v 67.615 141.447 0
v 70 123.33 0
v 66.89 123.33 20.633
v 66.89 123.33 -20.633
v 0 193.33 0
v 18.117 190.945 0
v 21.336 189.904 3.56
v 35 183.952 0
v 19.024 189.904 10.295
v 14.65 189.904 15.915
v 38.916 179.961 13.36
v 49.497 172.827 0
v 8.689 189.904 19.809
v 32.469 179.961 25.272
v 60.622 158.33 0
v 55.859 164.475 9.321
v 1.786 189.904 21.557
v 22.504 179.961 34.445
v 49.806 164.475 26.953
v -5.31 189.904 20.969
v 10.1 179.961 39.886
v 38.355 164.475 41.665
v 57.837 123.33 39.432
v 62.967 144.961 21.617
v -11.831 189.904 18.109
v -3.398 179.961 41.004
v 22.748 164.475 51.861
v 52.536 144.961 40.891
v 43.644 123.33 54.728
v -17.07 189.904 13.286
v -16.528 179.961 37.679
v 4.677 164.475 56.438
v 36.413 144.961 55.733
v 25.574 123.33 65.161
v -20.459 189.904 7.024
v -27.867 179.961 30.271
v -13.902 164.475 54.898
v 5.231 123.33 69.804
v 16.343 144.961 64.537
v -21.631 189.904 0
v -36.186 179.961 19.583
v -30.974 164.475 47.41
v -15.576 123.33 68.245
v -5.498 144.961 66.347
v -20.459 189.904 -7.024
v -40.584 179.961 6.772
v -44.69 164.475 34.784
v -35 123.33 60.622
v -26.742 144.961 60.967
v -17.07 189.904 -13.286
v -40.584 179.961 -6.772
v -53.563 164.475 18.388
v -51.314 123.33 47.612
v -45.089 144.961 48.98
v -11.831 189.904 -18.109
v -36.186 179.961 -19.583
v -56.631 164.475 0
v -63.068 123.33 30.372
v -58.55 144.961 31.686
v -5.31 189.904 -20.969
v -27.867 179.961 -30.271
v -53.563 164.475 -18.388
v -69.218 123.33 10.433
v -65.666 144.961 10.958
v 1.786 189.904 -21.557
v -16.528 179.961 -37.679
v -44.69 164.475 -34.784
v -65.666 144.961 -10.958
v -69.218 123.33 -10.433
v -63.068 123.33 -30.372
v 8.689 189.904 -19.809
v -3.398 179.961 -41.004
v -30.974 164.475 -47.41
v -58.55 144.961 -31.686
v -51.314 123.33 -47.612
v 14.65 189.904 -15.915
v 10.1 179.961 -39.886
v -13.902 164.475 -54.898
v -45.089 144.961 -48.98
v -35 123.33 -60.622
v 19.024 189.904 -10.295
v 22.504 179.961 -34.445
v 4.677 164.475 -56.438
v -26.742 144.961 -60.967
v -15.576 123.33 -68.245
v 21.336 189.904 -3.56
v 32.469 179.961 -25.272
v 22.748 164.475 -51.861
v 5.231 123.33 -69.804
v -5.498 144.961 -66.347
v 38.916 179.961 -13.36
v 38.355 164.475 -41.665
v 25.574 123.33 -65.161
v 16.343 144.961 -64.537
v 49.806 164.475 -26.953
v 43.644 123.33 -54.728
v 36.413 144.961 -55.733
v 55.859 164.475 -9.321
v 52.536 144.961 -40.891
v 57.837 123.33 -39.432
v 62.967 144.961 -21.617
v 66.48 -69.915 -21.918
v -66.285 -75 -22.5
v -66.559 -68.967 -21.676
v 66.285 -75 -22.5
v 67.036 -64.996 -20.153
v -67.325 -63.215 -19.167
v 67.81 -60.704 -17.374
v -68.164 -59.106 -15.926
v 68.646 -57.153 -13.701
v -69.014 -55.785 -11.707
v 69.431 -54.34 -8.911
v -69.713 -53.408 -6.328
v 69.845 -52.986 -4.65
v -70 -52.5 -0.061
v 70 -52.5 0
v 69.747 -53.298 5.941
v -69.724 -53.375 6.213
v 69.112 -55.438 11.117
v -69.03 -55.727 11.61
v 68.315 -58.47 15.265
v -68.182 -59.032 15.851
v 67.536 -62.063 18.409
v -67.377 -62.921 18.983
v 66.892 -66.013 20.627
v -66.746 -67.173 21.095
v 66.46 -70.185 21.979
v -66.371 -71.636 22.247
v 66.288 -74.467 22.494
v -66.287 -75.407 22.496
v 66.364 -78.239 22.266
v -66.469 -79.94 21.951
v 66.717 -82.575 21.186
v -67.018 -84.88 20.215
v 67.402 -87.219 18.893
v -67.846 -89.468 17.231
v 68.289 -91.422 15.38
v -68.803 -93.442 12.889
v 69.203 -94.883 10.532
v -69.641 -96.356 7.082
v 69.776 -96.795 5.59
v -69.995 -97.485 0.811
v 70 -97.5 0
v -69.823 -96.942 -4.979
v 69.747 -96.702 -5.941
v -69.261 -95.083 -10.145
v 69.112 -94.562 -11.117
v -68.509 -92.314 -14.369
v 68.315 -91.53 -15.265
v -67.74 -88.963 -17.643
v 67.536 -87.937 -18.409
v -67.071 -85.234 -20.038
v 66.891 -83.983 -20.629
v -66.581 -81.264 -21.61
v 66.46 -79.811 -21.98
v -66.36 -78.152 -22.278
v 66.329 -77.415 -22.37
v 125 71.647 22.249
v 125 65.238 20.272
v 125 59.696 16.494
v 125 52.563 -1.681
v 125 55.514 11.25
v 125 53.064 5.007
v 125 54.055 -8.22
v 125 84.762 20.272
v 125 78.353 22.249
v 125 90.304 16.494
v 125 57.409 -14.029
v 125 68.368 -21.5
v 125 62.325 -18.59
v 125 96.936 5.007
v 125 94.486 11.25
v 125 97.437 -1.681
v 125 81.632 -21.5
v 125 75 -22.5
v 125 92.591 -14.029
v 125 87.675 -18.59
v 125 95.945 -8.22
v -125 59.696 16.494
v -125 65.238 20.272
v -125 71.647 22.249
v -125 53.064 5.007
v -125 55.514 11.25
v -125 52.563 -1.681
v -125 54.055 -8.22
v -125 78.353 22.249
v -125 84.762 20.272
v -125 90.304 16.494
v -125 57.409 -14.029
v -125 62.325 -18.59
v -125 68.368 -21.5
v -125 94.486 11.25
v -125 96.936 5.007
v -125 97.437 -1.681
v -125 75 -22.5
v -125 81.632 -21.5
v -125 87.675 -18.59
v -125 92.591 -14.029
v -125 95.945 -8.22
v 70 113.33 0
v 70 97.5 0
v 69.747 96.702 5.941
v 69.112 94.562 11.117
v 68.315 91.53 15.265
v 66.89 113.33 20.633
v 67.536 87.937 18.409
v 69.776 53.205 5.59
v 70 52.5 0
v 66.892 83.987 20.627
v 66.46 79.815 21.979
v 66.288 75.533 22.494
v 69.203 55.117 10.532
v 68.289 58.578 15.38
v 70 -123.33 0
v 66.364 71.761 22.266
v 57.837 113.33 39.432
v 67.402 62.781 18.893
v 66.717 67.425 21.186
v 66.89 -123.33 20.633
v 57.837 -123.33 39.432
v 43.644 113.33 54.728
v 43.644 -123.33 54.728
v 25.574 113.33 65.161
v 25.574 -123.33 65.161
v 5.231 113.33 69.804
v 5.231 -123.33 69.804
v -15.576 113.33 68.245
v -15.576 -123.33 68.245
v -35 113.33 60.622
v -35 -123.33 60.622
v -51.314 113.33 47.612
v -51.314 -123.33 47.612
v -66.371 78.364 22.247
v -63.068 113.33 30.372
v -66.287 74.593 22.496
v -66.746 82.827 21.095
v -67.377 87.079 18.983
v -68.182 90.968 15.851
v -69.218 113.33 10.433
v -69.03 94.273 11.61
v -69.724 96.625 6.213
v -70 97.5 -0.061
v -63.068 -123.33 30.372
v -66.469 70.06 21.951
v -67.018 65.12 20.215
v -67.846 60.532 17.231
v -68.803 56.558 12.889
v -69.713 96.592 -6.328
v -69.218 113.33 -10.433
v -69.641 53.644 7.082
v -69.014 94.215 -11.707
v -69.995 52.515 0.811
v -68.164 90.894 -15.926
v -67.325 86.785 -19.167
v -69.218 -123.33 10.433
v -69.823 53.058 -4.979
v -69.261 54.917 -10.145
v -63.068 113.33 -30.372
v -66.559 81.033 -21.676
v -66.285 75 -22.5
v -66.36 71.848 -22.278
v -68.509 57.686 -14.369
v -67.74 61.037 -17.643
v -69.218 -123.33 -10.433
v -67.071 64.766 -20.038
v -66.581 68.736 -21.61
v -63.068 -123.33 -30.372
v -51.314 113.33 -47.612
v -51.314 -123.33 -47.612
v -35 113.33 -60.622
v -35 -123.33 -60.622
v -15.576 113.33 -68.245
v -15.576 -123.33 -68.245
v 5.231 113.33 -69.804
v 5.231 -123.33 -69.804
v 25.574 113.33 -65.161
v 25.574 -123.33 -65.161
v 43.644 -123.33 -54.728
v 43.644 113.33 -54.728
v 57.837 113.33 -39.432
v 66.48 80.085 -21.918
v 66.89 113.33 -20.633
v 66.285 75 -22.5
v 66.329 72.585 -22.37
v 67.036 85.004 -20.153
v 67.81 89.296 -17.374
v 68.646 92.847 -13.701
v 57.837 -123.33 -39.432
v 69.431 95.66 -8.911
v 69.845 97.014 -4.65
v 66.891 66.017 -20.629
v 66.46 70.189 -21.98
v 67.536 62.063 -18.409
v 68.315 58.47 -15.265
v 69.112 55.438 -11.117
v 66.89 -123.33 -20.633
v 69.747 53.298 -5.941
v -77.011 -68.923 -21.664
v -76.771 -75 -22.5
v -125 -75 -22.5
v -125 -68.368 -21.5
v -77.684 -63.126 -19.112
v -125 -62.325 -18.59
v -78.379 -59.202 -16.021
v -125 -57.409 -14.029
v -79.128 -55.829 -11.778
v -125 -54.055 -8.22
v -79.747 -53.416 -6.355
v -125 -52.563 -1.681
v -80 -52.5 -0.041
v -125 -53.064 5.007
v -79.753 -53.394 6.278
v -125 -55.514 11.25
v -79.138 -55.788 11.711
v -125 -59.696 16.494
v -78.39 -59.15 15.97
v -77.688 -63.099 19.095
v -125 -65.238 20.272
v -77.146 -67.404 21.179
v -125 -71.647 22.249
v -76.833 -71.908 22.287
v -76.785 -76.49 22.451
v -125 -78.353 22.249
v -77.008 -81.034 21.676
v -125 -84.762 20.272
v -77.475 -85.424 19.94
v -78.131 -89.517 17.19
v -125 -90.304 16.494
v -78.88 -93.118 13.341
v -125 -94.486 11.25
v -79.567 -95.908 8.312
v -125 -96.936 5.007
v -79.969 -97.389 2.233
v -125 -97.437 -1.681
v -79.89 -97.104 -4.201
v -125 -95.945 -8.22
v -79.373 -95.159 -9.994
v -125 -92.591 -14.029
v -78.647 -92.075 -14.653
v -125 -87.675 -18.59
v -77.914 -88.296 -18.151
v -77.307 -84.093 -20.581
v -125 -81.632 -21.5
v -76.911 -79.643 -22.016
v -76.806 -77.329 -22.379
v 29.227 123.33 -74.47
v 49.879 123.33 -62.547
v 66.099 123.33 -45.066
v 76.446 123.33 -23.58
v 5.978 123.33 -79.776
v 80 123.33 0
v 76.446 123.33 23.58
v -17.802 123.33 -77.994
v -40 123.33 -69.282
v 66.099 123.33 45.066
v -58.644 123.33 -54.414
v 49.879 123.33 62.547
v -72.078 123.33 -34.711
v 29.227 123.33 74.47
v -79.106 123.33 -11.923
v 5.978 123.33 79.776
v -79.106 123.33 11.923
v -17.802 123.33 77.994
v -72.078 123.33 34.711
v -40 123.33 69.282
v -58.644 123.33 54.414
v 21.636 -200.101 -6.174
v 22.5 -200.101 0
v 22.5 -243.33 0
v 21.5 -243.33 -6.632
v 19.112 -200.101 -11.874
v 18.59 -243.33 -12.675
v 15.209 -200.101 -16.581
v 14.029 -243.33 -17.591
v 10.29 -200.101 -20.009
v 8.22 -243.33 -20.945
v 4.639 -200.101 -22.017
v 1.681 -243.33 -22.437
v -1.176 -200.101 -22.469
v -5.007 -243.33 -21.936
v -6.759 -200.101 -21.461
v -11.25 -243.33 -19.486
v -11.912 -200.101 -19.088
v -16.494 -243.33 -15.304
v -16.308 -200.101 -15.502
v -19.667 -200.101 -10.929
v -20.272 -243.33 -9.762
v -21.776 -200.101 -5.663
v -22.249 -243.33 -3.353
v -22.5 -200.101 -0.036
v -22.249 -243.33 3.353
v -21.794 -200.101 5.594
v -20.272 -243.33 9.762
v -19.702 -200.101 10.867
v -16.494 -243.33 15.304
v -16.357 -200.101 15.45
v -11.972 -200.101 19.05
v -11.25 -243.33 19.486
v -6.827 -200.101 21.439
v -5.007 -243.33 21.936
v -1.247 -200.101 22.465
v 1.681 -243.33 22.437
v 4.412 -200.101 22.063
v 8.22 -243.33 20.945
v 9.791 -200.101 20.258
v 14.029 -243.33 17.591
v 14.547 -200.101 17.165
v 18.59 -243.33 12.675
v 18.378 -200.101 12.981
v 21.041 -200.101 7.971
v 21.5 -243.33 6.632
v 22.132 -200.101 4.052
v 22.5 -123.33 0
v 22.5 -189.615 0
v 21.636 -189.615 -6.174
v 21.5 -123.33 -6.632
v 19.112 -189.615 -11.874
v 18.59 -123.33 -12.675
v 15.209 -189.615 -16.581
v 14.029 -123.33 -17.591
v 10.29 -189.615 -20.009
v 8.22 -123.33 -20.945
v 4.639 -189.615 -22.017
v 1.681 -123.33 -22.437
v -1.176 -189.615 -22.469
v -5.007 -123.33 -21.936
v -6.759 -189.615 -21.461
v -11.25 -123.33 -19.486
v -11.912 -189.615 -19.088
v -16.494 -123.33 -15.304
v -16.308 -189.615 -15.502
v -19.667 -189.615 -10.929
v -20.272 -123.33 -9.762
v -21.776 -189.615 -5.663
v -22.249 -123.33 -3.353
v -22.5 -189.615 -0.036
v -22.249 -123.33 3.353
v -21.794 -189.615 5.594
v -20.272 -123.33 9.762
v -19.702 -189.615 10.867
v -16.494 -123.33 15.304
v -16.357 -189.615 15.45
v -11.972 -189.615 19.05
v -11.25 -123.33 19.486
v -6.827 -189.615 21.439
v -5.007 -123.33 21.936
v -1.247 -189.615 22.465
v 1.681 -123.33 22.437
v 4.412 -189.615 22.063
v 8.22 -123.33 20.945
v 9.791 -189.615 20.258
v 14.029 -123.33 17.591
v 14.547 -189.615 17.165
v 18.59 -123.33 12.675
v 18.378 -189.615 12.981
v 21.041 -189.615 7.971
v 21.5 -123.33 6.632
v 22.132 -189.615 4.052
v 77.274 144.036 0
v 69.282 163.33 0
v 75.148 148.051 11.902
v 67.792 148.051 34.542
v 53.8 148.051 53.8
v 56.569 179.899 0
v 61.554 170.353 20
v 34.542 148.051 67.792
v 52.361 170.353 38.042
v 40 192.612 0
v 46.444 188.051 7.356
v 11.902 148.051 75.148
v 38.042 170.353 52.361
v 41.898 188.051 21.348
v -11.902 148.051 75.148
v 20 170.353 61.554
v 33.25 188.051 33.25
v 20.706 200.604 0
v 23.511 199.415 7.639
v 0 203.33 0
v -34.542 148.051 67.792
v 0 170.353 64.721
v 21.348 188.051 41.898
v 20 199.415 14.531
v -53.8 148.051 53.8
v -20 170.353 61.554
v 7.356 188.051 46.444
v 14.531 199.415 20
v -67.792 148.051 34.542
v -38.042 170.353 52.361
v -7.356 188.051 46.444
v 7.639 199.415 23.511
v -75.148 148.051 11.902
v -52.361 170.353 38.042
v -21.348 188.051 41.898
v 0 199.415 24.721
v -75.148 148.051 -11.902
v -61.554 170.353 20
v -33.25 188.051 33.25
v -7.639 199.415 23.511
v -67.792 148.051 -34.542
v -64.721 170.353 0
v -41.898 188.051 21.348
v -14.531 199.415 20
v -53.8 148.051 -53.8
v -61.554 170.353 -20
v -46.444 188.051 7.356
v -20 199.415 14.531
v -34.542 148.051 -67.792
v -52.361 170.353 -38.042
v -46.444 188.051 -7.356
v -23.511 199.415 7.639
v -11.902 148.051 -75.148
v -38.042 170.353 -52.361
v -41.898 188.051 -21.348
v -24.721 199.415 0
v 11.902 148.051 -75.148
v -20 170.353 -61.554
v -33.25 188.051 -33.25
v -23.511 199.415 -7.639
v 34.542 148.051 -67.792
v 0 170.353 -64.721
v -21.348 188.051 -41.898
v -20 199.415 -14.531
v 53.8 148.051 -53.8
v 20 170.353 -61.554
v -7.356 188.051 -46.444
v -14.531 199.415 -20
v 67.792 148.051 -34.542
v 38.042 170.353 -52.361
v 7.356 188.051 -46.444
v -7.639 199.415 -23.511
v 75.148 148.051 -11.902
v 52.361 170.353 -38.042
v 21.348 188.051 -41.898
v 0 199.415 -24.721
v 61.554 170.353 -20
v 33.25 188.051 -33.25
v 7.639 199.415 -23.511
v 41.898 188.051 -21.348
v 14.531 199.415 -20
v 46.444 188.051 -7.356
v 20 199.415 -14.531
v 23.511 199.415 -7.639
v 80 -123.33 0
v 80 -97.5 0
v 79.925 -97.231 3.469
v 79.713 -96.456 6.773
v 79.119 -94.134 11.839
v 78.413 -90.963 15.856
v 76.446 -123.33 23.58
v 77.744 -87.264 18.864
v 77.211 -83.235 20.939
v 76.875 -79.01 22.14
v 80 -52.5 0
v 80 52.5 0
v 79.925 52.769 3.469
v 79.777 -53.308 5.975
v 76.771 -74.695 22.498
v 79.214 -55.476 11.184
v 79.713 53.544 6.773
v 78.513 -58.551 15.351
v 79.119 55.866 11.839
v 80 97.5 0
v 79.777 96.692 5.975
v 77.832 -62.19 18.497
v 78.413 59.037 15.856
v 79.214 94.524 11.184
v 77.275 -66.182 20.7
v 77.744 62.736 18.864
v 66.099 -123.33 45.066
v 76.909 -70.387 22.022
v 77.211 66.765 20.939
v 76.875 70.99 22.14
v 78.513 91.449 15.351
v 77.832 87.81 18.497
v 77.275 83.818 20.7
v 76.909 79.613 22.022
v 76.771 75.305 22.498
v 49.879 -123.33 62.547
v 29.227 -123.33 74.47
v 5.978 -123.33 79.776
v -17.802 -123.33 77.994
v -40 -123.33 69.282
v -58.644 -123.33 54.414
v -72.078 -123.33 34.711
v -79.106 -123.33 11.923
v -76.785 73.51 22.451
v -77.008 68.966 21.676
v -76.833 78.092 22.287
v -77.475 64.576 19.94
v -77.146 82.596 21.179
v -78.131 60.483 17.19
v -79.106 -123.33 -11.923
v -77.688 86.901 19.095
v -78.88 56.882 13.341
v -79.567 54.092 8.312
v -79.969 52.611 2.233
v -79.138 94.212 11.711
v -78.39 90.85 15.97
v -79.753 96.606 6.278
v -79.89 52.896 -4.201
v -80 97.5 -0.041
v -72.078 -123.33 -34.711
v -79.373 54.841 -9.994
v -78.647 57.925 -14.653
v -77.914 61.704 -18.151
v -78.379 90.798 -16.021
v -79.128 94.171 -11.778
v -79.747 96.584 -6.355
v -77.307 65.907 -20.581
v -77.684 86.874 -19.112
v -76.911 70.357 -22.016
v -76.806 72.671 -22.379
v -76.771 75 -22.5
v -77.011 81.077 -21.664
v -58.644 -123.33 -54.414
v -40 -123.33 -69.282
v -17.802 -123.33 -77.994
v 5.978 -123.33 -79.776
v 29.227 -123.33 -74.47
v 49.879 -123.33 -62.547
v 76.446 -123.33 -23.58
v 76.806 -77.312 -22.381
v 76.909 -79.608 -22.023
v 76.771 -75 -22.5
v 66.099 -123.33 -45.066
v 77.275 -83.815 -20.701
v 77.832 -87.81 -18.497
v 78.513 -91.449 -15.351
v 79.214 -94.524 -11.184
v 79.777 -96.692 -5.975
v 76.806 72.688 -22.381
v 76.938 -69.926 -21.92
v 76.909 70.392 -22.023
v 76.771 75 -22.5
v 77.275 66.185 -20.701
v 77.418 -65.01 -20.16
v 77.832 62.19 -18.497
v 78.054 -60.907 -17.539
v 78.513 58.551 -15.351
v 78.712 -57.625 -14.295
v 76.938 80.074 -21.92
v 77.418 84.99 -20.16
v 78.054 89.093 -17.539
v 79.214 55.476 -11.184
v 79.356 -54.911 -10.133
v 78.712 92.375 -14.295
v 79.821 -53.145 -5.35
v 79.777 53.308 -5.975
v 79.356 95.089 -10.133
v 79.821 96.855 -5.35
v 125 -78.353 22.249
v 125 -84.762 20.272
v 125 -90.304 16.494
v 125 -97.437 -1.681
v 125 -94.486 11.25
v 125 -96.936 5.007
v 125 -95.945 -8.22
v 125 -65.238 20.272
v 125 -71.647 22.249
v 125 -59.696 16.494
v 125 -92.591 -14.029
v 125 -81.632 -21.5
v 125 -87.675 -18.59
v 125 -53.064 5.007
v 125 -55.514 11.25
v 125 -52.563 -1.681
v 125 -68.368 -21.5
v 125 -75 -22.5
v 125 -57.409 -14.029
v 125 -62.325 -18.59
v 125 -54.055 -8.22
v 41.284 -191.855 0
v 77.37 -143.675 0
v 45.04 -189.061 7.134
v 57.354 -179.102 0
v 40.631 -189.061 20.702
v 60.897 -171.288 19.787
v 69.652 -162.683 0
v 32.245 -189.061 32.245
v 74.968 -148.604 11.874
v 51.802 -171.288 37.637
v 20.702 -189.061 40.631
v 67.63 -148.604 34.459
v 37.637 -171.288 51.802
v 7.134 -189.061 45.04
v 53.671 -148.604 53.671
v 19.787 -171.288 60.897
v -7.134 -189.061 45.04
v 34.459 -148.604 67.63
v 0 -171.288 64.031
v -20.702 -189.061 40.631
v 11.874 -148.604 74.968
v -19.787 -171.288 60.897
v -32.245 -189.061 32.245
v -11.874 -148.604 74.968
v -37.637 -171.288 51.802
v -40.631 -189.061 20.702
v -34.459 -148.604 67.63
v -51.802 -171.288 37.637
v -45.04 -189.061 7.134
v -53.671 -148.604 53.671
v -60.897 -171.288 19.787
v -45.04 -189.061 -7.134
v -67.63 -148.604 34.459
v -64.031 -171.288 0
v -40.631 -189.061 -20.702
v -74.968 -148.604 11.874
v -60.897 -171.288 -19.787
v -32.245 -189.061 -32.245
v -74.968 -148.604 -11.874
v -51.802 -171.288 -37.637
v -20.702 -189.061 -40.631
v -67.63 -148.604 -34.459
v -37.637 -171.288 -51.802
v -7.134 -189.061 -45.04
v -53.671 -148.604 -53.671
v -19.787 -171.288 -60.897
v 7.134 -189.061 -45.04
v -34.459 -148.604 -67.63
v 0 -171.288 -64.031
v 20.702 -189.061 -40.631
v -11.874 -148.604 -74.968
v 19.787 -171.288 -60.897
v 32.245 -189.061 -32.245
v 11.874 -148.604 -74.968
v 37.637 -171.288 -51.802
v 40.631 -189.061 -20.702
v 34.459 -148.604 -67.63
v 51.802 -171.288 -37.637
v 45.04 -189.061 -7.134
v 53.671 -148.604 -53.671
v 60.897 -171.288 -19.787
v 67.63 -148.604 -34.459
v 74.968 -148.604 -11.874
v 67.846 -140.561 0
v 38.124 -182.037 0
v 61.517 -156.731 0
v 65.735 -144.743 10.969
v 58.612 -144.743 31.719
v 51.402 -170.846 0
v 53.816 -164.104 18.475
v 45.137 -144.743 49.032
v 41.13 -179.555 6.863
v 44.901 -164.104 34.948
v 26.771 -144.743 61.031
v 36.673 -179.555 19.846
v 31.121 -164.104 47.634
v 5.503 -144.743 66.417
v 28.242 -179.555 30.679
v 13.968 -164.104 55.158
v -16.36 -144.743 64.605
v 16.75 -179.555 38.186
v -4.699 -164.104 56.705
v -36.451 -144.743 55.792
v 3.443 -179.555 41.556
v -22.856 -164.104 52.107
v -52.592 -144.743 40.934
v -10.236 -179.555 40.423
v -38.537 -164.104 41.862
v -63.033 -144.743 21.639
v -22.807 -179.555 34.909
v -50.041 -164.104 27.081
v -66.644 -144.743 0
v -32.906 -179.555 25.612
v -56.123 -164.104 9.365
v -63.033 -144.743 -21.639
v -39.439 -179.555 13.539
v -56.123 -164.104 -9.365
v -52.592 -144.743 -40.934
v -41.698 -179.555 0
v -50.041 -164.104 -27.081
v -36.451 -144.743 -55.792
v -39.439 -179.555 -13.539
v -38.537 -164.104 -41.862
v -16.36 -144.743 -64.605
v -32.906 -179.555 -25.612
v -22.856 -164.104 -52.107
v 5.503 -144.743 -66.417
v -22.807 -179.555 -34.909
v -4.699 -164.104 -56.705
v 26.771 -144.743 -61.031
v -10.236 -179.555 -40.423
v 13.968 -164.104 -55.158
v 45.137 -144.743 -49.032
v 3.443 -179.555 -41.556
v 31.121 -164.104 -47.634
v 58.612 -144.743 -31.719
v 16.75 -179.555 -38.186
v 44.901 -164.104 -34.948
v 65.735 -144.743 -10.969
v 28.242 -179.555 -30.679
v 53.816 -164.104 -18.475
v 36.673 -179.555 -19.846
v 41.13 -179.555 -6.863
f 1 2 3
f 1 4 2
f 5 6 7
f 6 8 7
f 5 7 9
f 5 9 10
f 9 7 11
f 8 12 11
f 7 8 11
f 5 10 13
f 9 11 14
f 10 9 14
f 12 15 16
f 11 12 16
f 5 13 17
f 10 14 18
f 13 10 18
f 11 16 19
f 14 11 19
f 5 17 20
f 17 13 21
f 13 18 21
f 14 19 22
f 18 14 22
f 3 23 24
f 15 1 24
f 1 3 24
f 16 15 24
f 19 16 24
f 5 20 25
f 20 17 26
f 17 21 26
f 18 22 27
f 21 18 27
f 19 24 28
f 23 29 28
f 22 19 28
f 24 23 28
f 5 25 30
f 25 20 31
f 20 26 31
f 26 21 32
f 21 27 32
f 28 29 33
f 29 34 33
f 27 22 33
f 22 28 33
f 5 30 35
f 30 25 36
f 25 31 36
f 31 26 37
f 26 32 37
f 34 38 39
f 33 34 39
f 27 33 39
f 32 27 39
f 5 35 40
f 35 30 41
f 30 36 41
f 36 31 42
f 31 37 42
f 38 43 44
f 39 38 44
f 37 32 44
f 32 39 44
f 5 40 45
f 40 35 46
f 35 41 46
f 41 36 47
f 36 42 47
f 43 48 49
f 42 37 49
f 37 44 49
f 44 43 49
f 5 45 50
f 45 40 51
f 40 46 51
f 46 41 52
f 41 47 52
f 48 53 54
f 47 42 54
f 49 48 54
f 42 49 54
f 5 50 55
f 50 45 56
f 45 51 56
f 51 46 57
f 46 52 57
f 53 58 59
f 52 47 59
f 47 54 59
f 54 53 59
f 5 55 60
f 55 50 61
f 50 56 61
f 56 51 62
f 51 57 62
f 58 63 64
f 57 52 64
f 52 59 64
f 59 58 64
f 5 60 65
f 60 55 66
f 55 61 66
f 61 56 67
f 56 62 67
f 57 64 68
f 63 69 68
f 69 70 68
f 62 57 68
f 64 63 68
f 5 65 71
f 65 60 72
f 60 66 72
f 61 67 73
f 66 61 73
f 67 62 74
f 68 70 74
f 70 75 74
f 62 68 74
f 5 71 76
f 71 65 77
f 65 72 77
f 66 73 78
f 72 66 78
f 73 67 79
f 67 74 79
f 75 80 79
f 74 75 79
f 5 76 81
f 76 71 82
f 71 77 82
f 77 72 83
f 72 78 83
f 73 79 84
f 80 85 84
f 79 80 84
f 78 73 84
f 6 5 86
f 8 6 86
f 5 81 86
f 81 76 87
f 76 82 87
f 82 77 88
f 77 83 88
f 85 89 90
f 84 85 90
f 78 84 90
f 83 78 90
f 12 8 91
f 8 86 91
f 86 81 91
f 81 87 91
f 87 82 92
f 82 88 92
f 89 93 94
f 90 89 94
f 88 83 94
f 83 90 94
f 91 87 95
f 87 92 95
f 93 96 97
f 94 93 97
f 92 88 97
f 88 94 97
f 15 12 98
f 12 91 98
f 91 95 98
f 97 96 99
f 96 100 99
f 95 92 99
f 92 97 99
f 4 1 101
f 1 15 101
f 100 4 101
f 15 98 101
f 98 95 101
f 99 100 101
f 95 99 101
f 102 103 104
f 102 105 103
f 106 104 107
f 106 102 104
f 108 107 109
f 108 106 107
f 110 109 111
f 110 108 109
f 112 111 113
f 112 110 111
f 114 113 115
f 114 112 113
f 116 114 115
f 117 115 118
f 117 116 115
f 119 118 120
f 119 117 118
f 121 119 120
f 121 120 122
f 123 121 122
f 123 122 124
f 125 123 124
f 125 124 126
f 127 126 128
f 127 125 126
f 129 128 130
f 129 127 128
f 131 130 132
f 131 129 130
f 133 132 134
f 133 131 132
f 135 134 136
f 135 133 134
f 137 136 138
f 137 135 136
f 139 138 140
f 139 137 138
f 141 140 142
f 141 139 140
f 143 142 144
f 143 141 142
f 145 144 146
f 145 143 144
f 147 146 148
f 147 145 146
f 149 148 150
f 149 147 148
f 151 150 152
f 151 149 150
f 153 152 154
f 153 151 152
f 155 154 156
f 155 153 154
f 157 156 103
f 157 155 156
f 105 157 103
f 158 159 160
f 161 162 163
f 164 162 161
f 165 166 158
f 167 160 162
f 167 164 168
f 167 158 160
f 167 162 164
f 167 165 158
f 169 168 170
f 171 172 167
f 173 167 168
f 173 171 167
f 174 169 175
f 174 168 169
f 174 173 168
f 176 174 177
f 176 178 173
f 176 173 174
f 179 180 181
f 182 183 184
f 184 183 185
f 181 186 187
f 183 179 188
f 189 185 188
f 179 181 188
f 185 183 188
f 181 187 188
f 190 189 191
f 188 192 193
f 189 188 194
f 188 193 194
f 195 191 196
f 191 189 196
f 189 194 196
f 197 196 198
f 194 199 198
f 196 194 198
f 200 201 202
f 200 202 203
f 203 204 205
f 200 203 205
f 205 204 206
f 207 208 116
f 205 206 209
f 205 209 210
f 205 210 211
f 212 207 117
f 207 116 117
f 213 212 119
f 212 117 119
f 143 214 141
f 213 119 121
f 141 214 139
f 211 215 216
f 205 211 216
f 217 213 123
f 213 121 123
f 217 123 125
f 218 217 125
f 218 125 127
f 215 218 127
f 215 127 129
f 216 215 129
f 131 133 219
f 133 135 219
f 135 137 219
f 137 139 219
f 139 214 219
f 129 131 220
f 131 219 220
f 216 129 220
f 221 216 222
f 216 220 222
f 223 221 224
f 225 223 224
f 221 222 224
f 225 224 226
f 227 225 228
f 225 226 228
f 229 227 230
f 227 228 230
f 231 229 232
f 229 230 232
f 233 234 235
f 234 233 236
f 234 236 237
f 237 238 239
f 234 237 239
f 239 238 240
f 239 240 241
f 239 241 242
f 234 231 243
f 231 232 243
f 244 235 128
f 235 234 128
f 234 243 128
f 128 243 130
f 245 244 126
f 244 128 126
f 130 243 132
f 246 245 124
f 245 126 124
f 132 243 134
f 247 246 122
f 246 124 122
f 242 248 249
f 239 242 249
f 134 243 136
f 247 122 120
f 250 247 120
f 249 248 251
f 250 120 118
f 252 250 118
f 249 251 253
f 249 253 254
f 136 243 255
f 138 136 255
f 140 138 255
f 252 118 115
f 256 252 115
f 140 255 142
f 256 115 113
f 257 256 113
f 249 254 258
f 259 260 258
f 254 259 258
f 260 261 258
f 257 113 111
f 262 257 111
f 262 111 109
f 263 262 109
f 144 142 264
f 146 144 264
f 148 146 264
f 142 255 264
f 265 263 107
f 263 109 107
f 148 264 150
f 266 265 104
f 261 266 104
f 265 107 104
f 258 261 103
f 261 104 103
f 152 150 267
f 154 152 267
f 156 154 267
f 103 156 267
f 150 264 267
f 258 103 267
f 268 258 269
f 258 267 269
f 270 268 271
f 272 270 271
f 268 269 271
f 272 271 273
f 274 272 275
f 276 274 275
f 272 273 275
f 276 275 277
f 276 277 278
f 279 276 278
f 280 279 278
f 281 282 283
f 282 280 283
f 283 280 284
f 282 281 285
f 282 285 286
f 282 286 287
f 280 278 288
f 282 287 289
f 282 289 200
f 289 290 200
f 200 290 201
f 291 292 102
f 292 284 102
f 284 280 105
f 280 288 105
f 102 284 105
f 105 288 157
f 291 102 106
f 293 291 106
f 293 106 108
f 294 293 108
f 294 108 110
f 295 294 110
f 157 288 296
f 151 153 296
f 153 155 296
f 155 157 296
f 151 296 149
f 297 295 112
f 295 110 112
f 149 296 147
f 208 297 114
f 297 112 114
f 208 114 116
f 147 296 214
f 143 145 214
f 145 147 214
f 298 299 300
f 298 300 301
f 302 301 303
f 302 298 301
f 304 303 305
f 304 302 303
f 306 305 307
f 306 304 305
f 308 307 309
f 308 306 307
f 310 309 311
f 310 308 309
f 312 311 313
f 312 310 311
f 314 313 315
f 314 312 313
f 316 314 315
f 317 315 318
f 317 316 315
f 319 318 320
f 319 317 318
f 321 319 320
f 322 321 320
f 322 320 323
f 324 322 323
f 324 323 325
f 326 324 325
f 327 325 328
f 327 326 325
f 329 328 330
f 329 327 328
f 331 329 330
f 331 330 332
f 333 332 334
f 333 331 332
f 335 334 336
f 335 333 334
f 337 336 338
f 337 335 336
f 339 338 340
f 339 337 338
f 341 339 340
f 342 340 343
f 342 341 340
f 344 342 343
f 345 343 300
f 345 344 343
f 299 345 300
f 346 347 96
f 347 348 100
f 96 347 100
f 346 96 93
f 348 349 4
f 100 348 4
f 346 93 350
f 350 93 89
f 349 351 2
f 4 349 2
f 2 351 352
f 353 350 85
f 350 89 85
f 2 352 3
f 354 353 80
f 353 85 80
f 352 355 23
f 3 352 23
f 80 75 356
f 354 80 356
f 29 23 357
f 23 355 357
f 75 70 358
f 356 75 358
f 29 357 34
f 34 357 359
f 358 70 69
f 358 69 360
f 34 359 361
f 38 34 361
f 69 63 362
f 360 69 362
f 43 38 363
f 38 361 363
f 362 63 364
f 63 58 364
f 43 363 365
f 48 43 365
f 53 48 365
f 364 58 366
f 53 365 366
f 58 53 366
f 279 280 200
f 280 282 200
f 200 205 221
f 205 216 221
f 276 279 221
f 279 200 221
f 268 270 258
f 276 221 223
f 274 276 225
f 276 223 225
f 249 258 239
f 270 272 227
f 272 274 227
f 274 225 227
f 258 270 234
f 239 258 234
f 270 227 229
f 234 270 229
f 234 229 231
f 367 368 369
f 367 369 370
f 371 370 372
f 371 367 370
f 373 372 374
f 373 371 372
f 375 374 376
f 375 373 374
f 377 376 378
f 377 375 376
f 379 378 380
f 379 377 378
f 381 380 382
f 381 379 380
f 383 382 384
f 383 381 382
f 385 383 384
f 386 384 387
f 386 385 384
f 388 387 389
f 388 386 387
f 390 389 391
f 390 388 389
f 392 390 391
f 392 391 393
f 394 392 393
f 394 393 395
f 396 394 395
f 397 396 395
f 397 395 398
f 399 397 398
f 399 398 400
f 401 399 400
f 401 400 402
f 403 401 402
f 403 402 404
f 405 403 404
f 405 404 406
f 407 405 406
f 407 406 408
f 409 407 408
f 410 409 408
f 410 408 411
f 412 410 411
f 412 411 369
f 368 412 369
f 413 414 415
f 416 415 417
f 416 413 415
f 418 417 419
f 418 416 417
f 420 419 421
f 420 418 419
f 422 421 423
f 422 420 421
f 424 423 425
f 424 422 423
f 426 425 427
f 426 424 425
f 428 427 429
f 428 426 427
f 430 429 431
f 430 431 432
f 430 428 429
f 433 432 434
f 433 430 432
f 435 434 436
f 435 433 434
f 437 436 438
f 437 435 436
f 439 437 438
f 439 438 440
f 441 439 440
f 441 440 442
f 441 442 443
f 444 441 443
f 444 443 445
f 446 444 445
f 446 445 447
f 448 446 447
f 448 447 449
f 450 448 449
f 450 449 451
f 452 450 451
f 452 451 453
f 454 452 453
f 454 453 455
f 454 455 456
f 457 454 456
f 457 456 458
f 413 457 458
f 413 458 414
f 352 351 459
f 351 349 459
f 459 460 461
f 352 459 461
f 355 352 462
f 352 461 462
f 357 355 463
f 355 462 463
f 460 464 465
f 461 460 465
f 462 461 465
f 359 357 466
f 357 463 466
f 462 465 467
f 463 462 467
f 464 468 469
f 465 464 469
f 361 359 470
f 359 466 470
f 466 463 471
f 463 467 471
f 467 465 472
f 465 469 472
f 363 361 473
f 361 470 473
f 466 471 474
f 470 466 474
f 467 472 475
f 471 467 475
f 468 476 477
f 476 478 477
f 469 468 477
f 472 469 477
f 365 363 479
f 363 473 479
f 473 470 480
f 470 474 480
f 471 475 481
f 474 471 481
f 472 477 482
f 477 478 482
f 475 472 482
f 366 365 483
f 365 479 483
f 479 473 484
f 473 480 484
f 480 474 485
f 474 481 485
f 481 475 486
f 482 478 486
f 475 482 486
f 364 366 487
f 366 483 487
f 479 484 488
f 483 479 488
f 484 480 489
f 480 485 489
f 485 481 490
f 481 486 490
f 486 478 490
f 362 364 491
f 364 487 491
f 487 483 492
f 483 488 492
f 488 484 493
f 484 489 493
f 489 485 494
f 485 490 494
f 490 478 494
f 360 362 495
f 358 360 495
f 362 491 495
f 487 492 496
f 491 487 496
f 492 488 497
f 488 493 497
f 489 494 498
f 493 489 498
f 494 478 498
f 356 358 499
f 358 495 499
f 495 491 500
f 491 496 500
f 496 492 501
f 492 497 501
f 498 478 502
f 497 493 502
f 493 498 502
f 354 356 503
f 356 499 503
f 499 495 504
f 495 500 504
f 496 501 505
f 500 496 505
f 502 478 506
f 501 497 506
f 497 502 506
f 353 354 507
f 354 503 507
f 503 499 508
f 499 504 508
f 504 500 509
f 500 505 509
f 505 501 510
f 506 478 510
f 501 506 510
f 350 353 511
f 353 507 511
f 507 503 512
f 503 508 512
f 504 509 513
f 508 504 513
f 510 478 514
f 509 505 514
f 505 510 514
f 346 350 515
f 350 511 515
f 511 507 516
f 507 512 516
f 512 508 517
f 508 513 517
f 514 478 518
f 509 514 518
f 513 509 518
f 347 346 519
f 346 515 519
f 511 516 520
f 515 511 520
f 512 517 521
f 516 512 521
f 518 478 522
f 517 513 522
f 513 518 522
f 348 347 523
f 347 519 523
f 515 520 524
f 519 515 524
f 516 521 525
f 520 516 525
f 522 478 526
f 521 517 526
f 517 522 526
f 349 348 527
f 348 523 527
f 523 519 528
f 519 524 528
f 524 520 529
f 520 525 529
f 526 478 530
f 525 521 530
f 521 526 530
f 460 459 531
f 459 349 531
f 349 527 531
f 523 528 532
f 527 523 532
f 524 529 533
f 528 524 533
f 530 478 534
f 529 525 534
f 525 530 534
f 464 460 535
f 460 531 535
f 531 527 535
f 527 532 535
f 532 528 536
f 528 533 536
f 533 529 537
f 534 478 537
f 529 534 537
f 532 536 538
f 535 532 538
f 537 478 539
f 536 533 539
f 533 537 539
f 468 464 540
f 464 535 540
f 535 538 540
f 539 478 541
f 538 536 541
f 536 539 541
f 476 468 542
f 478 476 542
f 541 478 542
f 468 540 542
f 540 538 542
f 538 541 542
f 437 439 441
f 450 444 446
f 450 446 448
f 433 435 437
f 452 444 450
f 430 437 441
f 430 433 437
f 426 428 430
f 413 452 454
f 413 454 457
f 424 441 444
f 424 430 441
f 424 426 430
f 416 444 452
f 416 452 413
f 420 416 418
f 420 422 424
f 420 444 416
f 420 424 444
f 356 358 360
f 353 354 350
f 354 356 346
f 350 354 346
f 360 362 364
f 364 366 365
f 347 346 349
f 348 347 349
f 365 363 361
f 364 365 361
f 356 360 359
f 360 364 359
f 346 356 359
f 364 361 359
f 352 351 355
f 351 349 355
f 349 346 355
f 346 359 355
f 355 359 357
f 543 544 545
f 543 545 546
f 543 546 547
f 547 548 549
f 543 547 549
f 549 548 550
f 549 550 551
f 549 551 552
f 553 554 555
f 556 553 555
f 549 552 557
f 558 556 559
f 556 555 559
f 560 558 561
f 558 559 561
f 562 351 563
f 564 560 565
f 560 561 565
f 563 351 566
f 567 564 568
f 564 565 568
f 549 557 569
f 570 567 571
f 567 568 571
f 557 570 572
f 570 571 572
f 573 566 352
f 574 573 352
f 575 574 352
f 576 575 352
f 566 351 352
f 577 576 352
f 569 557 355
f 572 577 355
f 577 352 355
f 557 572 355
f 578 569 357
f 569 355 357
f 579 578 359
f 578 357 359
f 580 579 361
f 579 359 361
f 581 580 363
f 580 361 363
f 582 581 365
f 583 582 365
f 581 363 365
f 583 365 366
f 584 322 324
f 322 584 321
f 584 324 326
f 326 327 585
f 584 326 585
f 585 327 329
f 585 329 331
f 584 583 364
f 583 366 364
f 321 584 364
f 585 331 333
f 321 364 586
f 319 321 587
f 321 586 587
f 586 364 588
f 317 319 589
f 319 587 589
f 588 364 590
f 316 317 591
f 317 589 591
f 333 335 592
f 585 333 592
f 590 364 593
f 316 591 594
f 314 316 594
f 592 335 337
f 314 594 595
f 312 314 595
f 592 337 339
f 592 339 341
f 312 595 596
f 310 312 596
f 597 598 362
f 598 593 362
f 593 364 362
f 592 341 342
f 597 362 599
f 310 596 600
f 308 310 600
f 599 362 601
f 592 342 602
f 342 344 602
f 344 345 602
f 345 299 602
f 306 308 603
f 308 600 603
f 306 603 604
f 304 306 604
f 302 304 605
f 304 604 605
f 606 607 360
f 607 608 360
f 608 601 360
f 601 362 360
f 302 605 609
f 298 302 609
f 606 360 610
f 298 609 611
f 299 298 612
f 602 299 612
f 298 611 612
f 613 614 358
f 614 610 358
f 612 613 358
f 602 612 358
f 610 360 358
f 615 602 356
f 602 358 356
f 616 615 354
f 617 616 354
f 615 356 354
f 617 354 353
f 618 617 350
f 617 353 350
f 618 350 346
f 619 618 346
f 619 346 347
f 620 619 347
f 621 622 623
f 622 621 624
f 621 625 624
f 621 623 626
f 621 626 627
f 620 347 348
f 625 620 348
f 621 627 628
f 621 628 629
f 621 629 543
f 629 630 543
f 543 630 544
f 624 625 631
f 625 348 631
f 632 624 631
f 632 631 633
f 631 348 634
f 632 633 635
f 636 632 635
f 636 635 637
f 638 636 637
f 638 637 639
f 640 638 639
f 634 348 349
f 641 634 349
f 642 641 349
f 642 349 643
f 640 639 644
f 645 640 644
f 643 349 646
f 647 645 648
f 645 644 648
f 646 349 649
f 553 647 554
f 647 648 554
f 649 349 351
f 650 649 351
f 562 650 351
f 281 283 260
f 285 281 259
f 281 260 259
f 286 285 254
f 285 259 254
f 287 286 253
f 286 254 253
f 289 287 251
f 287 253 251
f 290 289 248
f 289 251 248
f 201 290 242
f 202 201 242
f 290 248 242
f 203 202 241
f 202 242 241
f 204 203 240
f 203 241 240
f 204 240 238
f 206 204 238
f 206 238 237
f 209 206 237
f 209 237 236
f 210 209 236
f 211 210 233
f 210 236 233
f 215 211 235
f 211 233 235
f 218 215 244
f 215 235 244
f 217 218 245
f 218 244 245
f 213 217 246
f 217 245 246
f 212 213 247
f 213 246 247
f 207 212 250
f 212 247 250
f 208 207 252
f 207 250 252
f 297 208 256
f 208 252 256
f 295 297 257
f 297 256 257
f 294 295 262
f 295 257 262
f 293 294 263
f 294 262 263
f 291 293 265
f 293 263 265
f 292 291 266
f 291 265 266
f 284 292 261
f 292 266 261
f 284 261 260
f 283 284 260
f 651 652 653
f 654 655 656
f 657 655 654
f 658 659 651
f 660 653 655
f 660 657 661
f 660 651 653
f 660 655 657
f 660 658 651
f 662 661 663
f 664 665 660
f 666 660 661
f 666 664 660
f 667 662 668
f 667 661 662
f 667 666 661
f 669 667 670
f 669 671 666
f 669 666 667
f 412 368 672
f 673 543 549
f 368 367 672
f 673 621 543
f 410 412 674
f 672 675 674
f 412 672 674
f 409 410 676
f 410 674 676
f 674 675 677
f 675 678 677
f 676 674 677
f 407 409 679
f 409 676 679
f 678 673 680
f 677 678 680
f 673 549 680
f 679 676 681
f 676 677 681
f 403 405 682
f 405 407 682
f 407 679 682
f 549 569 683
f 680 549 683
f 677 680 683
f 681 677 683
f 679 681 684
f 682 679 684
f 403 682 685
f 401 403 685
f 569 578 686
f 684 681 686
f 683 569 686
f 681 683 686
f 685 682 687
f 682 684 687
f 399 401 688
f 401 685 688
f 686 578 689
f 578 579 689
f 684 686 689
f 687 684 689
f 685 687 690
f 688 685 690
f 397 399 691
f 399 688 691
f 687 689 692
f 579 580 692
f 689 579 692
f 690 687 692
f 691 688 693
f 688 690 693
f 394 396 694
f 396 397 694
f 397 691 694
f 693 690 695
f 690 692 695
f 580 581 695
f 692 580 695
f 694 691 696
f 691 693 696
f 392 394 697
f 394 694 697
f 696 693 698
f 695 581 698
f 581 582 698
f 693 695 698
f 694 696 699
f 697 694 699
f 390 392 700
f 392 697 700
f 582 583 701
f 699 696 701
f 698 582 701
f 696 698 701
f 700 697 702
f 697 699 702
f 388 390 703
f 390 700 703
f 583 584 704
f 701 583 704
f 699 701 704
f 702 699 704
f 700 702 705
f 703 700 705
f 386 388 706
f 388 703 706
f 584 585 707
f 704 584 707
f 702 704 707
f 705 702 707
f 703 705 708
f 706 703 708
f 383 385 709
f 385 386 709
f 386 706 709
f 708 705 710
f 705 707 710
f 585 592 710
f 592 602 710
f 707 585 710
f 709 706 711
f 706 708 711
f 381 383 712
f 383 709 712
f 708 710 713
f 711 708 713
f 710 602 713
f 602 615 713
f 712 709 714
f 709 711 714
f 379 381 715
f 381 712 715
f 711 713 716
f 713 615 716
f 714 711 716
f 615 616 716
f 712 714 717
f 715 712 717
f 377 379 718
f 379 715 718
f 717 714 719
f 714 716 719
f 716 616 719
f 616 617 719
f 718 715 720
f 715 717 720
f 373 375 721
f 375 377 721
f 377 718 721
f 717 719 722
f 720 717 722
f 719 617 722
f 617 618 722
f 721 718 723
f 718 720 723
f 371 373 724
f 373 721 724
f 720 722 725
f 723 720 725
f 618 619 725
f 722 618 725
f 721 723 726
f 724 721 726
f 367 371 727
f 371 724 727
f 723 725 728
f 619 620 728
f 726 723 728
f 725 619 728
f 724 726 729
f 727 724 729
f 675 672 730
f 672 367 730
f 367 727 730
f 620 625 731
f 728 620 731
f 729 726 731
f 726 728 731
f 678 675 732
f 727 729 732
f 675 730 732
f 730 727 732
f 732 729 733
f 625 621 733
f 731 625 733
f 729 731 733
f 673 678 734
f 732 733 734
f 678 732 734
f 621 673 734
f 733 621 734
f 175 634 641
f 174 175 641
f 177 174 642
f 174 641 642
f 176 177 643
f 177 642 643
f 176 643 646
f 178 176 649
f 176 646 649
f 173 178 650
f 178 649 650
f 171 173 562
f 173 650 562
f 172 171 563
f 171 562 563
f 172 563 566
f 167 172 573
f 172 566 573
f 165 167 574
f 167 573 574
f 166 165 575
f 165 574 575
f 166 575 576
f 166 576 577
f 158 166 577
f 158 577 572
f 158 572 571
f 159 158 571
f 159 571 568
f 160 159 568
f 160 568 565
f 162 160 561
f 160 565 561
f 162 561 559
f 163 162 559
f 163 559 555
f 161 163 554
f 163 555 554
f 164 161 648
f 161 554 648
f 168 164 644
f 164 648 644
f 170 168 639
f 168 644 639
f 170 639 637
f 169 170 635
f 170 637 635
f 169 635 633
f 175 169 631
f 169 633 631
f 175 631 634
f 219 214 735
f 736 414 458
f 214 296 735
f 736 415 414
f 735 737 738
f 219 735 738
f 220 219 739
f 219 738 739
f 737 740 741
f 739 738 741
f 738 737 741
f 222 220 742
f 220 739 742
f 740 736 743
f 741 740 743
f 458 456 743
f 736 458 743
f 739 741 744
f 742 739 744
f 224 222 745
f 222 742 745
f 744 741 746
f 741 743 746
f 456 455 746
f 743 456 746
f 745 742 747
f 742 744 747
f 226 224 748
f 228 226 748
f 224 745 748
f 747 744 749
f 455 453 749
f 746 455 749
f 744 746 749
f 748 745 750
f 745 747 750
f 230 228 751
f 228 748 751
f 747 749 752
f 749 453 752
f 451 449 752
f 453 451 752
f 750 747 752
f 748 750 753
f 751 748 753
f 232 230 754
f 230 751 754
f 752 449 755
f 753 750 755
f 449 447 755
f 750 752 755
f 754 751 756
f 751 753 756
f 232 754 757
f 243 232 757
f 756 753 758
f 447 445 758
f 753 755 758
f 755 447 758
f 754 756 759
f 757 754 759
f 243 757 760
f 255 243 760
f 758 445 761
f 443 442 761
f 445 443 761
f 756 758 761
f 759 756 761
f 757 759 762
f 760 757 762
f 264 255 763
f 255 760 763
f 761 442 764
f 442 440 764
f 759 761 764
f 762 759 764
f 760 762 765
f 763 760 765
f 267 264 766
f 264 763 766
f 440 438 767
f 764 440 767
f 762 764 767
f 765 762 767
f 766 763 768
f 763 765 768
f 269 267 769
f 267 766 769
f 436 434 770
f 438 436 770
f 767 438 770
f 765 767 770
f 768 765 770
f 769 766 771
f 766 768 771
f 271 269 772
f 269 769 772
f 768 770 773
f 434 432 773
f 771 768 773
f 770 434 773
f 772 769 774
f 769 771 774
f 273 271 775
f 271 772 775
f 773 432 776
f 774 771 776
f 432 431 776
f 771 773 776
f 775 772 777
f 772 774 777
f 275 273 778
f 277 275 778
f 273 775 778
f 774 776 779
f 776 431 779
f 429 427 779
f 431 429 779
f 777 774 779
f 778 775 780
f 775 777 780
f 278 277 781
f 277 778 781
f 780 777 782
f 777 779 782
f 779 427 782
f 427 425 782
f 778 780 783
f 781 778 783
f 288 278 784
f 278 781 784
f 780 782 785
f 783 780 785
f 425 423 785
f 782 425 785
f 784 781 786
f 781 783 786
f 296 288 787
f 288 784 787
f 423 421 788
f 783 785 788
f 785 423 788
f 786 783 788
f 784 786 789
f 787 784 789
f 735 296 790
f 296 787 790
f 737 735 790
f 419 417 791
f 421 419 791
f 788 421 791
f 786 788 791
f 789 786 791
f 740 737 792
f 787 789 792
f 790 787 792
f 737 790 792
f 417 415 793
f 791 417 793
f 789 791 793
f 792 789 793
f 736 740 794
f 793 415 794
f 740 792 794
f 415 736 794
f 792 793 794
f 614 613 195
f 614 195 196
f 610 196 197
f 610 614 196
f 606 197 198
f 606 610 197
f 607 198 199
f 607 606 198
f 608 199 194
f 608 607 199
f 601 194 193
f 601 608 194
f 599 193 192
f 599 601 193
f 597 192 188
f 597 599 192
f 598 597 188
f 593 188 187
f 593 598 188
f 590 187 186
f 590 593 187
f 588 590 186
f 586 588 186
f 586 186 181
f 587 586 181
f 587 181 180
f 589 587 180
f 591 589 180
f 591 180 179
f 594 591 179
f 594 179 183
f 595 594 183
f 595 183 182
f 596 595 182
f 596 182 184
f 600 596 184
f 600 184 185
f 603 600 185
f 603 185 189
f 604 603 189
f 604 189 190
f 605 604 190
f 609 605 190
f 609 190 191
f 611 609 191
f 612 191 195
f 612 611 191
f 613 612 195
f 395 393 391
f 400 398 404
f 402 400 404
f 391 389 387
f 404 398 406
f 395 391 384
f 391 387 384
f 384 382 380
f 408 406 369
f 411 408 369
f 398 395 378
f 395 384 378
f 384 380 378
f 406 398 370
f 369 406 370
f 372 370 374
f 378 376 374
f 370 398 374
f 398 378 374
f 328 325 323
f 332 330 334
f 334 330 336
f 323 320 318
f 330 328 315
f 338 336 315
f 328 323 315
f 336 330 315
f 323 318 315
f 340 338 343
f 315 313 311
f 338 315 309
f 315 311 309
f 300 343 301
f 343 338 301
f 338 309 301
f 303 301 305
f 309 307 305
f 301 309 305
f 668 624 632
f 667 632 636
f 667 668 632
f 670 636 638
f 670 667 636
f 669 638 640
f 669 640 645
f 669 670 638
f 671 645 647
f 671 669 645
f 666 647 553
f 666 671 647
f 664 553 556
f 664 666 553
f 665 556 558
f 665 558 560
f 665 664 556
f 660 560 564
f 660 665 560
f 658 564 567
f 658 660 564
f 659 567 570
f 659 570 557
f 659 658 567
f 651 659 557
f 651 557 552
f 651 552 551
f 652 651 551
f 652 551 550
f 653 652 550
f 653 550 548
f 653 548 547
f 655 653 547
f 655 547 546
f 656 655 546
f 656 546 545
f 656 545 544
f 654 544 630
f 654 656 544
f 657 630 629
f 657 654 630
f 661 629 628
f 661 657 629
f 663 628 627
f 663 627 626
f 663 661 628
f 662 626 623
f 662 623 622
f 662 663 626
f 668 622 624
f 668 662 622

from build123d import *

# Parameters (mm, degrees)
SKETCH1_W           = 10
SKETCH1_H           = 113.33
SKETCH2_R           = 22.5
BOSS_EXTRUDE1_DEPTH = 125
SKETCH3_R           = 22.5
BOSS_EXTRUDE2_DEPTH = 120


with BuildPart() as part:
    # Sketch1 → Revolve1 (revolve)
    with BuildSketch(Plane.XY):
        Polygon((80, 113.33), (80, 123.33), (70, 123.33), (0, 123.33), (0, 113.33), (70, 113.33), align=None)
        with Locations((75, 56.665)):
            Rectangle(SKETCH1_W, SKETCH1_H)
        with BuildLine():
            Line((80, -123.33), (80, 0))
            Line((80, 0), (70, 0))
            Line((70, 0), (70, -123.33))
            ThreePointArc((70, -123.33), (49.497474683, -172.827474683), (0, -193.33))
            Line((0, -193.33), (0, -203.33))
            ThreePointArc((0, -203.33), (56.568542495, -179.898542495), (80, -123.33))
        make_face()
    revolve(axis=Axis((0, 203.33, 0), (0, -1, 0)))

    # Sketch2 → Boss-Extrude1 (add, symmetric)
    with BuildSketch(Plane(origin=(0, 0, 0), x_dir=(0, 0, -1), z_dir=(1, 0, 0))):
        with Locations((0, 75)):
            Circle(SKETCH2_R)
        with Locations((0, -75)):
            Circle(SKETCH2_R)
    extrude(amount=BOSS_EXTRUDE1_DEPTH, both=True)

    # Sketch3 → Boss-Extrude2 (add)
    with BuildSketch(Plane(origin=(0, -123.33, 0), x_dir=(1, 0, 0), z_dir=(0, 1, 0))):
        Circle(SKETCH3_R)
    extrude(amount=-BOSS_EXTRUDE2_DEPTH)


with BuildPart() as body_2:
    # Sketch1<3> → Revolve2 (revolve)
    with BuildSketch(Plane.XY):
        with BuildLine():
            Line((0, 203.33), (0, 193.33))
            ThreePointArc((0, 193.33), (49.497474683, 172.827474683), (70, 123.33))
            Line((70, 123.33), (80, 123.33))
            ThreePointArc((80, 123.33), (56.568542495, 179.898542495), (0, 203.33))
        make_face()
    revolve(axis=Axis((0, 203.33, 0), (0, -1, 0)))


solid = Compound([part.part, body_2.part])
